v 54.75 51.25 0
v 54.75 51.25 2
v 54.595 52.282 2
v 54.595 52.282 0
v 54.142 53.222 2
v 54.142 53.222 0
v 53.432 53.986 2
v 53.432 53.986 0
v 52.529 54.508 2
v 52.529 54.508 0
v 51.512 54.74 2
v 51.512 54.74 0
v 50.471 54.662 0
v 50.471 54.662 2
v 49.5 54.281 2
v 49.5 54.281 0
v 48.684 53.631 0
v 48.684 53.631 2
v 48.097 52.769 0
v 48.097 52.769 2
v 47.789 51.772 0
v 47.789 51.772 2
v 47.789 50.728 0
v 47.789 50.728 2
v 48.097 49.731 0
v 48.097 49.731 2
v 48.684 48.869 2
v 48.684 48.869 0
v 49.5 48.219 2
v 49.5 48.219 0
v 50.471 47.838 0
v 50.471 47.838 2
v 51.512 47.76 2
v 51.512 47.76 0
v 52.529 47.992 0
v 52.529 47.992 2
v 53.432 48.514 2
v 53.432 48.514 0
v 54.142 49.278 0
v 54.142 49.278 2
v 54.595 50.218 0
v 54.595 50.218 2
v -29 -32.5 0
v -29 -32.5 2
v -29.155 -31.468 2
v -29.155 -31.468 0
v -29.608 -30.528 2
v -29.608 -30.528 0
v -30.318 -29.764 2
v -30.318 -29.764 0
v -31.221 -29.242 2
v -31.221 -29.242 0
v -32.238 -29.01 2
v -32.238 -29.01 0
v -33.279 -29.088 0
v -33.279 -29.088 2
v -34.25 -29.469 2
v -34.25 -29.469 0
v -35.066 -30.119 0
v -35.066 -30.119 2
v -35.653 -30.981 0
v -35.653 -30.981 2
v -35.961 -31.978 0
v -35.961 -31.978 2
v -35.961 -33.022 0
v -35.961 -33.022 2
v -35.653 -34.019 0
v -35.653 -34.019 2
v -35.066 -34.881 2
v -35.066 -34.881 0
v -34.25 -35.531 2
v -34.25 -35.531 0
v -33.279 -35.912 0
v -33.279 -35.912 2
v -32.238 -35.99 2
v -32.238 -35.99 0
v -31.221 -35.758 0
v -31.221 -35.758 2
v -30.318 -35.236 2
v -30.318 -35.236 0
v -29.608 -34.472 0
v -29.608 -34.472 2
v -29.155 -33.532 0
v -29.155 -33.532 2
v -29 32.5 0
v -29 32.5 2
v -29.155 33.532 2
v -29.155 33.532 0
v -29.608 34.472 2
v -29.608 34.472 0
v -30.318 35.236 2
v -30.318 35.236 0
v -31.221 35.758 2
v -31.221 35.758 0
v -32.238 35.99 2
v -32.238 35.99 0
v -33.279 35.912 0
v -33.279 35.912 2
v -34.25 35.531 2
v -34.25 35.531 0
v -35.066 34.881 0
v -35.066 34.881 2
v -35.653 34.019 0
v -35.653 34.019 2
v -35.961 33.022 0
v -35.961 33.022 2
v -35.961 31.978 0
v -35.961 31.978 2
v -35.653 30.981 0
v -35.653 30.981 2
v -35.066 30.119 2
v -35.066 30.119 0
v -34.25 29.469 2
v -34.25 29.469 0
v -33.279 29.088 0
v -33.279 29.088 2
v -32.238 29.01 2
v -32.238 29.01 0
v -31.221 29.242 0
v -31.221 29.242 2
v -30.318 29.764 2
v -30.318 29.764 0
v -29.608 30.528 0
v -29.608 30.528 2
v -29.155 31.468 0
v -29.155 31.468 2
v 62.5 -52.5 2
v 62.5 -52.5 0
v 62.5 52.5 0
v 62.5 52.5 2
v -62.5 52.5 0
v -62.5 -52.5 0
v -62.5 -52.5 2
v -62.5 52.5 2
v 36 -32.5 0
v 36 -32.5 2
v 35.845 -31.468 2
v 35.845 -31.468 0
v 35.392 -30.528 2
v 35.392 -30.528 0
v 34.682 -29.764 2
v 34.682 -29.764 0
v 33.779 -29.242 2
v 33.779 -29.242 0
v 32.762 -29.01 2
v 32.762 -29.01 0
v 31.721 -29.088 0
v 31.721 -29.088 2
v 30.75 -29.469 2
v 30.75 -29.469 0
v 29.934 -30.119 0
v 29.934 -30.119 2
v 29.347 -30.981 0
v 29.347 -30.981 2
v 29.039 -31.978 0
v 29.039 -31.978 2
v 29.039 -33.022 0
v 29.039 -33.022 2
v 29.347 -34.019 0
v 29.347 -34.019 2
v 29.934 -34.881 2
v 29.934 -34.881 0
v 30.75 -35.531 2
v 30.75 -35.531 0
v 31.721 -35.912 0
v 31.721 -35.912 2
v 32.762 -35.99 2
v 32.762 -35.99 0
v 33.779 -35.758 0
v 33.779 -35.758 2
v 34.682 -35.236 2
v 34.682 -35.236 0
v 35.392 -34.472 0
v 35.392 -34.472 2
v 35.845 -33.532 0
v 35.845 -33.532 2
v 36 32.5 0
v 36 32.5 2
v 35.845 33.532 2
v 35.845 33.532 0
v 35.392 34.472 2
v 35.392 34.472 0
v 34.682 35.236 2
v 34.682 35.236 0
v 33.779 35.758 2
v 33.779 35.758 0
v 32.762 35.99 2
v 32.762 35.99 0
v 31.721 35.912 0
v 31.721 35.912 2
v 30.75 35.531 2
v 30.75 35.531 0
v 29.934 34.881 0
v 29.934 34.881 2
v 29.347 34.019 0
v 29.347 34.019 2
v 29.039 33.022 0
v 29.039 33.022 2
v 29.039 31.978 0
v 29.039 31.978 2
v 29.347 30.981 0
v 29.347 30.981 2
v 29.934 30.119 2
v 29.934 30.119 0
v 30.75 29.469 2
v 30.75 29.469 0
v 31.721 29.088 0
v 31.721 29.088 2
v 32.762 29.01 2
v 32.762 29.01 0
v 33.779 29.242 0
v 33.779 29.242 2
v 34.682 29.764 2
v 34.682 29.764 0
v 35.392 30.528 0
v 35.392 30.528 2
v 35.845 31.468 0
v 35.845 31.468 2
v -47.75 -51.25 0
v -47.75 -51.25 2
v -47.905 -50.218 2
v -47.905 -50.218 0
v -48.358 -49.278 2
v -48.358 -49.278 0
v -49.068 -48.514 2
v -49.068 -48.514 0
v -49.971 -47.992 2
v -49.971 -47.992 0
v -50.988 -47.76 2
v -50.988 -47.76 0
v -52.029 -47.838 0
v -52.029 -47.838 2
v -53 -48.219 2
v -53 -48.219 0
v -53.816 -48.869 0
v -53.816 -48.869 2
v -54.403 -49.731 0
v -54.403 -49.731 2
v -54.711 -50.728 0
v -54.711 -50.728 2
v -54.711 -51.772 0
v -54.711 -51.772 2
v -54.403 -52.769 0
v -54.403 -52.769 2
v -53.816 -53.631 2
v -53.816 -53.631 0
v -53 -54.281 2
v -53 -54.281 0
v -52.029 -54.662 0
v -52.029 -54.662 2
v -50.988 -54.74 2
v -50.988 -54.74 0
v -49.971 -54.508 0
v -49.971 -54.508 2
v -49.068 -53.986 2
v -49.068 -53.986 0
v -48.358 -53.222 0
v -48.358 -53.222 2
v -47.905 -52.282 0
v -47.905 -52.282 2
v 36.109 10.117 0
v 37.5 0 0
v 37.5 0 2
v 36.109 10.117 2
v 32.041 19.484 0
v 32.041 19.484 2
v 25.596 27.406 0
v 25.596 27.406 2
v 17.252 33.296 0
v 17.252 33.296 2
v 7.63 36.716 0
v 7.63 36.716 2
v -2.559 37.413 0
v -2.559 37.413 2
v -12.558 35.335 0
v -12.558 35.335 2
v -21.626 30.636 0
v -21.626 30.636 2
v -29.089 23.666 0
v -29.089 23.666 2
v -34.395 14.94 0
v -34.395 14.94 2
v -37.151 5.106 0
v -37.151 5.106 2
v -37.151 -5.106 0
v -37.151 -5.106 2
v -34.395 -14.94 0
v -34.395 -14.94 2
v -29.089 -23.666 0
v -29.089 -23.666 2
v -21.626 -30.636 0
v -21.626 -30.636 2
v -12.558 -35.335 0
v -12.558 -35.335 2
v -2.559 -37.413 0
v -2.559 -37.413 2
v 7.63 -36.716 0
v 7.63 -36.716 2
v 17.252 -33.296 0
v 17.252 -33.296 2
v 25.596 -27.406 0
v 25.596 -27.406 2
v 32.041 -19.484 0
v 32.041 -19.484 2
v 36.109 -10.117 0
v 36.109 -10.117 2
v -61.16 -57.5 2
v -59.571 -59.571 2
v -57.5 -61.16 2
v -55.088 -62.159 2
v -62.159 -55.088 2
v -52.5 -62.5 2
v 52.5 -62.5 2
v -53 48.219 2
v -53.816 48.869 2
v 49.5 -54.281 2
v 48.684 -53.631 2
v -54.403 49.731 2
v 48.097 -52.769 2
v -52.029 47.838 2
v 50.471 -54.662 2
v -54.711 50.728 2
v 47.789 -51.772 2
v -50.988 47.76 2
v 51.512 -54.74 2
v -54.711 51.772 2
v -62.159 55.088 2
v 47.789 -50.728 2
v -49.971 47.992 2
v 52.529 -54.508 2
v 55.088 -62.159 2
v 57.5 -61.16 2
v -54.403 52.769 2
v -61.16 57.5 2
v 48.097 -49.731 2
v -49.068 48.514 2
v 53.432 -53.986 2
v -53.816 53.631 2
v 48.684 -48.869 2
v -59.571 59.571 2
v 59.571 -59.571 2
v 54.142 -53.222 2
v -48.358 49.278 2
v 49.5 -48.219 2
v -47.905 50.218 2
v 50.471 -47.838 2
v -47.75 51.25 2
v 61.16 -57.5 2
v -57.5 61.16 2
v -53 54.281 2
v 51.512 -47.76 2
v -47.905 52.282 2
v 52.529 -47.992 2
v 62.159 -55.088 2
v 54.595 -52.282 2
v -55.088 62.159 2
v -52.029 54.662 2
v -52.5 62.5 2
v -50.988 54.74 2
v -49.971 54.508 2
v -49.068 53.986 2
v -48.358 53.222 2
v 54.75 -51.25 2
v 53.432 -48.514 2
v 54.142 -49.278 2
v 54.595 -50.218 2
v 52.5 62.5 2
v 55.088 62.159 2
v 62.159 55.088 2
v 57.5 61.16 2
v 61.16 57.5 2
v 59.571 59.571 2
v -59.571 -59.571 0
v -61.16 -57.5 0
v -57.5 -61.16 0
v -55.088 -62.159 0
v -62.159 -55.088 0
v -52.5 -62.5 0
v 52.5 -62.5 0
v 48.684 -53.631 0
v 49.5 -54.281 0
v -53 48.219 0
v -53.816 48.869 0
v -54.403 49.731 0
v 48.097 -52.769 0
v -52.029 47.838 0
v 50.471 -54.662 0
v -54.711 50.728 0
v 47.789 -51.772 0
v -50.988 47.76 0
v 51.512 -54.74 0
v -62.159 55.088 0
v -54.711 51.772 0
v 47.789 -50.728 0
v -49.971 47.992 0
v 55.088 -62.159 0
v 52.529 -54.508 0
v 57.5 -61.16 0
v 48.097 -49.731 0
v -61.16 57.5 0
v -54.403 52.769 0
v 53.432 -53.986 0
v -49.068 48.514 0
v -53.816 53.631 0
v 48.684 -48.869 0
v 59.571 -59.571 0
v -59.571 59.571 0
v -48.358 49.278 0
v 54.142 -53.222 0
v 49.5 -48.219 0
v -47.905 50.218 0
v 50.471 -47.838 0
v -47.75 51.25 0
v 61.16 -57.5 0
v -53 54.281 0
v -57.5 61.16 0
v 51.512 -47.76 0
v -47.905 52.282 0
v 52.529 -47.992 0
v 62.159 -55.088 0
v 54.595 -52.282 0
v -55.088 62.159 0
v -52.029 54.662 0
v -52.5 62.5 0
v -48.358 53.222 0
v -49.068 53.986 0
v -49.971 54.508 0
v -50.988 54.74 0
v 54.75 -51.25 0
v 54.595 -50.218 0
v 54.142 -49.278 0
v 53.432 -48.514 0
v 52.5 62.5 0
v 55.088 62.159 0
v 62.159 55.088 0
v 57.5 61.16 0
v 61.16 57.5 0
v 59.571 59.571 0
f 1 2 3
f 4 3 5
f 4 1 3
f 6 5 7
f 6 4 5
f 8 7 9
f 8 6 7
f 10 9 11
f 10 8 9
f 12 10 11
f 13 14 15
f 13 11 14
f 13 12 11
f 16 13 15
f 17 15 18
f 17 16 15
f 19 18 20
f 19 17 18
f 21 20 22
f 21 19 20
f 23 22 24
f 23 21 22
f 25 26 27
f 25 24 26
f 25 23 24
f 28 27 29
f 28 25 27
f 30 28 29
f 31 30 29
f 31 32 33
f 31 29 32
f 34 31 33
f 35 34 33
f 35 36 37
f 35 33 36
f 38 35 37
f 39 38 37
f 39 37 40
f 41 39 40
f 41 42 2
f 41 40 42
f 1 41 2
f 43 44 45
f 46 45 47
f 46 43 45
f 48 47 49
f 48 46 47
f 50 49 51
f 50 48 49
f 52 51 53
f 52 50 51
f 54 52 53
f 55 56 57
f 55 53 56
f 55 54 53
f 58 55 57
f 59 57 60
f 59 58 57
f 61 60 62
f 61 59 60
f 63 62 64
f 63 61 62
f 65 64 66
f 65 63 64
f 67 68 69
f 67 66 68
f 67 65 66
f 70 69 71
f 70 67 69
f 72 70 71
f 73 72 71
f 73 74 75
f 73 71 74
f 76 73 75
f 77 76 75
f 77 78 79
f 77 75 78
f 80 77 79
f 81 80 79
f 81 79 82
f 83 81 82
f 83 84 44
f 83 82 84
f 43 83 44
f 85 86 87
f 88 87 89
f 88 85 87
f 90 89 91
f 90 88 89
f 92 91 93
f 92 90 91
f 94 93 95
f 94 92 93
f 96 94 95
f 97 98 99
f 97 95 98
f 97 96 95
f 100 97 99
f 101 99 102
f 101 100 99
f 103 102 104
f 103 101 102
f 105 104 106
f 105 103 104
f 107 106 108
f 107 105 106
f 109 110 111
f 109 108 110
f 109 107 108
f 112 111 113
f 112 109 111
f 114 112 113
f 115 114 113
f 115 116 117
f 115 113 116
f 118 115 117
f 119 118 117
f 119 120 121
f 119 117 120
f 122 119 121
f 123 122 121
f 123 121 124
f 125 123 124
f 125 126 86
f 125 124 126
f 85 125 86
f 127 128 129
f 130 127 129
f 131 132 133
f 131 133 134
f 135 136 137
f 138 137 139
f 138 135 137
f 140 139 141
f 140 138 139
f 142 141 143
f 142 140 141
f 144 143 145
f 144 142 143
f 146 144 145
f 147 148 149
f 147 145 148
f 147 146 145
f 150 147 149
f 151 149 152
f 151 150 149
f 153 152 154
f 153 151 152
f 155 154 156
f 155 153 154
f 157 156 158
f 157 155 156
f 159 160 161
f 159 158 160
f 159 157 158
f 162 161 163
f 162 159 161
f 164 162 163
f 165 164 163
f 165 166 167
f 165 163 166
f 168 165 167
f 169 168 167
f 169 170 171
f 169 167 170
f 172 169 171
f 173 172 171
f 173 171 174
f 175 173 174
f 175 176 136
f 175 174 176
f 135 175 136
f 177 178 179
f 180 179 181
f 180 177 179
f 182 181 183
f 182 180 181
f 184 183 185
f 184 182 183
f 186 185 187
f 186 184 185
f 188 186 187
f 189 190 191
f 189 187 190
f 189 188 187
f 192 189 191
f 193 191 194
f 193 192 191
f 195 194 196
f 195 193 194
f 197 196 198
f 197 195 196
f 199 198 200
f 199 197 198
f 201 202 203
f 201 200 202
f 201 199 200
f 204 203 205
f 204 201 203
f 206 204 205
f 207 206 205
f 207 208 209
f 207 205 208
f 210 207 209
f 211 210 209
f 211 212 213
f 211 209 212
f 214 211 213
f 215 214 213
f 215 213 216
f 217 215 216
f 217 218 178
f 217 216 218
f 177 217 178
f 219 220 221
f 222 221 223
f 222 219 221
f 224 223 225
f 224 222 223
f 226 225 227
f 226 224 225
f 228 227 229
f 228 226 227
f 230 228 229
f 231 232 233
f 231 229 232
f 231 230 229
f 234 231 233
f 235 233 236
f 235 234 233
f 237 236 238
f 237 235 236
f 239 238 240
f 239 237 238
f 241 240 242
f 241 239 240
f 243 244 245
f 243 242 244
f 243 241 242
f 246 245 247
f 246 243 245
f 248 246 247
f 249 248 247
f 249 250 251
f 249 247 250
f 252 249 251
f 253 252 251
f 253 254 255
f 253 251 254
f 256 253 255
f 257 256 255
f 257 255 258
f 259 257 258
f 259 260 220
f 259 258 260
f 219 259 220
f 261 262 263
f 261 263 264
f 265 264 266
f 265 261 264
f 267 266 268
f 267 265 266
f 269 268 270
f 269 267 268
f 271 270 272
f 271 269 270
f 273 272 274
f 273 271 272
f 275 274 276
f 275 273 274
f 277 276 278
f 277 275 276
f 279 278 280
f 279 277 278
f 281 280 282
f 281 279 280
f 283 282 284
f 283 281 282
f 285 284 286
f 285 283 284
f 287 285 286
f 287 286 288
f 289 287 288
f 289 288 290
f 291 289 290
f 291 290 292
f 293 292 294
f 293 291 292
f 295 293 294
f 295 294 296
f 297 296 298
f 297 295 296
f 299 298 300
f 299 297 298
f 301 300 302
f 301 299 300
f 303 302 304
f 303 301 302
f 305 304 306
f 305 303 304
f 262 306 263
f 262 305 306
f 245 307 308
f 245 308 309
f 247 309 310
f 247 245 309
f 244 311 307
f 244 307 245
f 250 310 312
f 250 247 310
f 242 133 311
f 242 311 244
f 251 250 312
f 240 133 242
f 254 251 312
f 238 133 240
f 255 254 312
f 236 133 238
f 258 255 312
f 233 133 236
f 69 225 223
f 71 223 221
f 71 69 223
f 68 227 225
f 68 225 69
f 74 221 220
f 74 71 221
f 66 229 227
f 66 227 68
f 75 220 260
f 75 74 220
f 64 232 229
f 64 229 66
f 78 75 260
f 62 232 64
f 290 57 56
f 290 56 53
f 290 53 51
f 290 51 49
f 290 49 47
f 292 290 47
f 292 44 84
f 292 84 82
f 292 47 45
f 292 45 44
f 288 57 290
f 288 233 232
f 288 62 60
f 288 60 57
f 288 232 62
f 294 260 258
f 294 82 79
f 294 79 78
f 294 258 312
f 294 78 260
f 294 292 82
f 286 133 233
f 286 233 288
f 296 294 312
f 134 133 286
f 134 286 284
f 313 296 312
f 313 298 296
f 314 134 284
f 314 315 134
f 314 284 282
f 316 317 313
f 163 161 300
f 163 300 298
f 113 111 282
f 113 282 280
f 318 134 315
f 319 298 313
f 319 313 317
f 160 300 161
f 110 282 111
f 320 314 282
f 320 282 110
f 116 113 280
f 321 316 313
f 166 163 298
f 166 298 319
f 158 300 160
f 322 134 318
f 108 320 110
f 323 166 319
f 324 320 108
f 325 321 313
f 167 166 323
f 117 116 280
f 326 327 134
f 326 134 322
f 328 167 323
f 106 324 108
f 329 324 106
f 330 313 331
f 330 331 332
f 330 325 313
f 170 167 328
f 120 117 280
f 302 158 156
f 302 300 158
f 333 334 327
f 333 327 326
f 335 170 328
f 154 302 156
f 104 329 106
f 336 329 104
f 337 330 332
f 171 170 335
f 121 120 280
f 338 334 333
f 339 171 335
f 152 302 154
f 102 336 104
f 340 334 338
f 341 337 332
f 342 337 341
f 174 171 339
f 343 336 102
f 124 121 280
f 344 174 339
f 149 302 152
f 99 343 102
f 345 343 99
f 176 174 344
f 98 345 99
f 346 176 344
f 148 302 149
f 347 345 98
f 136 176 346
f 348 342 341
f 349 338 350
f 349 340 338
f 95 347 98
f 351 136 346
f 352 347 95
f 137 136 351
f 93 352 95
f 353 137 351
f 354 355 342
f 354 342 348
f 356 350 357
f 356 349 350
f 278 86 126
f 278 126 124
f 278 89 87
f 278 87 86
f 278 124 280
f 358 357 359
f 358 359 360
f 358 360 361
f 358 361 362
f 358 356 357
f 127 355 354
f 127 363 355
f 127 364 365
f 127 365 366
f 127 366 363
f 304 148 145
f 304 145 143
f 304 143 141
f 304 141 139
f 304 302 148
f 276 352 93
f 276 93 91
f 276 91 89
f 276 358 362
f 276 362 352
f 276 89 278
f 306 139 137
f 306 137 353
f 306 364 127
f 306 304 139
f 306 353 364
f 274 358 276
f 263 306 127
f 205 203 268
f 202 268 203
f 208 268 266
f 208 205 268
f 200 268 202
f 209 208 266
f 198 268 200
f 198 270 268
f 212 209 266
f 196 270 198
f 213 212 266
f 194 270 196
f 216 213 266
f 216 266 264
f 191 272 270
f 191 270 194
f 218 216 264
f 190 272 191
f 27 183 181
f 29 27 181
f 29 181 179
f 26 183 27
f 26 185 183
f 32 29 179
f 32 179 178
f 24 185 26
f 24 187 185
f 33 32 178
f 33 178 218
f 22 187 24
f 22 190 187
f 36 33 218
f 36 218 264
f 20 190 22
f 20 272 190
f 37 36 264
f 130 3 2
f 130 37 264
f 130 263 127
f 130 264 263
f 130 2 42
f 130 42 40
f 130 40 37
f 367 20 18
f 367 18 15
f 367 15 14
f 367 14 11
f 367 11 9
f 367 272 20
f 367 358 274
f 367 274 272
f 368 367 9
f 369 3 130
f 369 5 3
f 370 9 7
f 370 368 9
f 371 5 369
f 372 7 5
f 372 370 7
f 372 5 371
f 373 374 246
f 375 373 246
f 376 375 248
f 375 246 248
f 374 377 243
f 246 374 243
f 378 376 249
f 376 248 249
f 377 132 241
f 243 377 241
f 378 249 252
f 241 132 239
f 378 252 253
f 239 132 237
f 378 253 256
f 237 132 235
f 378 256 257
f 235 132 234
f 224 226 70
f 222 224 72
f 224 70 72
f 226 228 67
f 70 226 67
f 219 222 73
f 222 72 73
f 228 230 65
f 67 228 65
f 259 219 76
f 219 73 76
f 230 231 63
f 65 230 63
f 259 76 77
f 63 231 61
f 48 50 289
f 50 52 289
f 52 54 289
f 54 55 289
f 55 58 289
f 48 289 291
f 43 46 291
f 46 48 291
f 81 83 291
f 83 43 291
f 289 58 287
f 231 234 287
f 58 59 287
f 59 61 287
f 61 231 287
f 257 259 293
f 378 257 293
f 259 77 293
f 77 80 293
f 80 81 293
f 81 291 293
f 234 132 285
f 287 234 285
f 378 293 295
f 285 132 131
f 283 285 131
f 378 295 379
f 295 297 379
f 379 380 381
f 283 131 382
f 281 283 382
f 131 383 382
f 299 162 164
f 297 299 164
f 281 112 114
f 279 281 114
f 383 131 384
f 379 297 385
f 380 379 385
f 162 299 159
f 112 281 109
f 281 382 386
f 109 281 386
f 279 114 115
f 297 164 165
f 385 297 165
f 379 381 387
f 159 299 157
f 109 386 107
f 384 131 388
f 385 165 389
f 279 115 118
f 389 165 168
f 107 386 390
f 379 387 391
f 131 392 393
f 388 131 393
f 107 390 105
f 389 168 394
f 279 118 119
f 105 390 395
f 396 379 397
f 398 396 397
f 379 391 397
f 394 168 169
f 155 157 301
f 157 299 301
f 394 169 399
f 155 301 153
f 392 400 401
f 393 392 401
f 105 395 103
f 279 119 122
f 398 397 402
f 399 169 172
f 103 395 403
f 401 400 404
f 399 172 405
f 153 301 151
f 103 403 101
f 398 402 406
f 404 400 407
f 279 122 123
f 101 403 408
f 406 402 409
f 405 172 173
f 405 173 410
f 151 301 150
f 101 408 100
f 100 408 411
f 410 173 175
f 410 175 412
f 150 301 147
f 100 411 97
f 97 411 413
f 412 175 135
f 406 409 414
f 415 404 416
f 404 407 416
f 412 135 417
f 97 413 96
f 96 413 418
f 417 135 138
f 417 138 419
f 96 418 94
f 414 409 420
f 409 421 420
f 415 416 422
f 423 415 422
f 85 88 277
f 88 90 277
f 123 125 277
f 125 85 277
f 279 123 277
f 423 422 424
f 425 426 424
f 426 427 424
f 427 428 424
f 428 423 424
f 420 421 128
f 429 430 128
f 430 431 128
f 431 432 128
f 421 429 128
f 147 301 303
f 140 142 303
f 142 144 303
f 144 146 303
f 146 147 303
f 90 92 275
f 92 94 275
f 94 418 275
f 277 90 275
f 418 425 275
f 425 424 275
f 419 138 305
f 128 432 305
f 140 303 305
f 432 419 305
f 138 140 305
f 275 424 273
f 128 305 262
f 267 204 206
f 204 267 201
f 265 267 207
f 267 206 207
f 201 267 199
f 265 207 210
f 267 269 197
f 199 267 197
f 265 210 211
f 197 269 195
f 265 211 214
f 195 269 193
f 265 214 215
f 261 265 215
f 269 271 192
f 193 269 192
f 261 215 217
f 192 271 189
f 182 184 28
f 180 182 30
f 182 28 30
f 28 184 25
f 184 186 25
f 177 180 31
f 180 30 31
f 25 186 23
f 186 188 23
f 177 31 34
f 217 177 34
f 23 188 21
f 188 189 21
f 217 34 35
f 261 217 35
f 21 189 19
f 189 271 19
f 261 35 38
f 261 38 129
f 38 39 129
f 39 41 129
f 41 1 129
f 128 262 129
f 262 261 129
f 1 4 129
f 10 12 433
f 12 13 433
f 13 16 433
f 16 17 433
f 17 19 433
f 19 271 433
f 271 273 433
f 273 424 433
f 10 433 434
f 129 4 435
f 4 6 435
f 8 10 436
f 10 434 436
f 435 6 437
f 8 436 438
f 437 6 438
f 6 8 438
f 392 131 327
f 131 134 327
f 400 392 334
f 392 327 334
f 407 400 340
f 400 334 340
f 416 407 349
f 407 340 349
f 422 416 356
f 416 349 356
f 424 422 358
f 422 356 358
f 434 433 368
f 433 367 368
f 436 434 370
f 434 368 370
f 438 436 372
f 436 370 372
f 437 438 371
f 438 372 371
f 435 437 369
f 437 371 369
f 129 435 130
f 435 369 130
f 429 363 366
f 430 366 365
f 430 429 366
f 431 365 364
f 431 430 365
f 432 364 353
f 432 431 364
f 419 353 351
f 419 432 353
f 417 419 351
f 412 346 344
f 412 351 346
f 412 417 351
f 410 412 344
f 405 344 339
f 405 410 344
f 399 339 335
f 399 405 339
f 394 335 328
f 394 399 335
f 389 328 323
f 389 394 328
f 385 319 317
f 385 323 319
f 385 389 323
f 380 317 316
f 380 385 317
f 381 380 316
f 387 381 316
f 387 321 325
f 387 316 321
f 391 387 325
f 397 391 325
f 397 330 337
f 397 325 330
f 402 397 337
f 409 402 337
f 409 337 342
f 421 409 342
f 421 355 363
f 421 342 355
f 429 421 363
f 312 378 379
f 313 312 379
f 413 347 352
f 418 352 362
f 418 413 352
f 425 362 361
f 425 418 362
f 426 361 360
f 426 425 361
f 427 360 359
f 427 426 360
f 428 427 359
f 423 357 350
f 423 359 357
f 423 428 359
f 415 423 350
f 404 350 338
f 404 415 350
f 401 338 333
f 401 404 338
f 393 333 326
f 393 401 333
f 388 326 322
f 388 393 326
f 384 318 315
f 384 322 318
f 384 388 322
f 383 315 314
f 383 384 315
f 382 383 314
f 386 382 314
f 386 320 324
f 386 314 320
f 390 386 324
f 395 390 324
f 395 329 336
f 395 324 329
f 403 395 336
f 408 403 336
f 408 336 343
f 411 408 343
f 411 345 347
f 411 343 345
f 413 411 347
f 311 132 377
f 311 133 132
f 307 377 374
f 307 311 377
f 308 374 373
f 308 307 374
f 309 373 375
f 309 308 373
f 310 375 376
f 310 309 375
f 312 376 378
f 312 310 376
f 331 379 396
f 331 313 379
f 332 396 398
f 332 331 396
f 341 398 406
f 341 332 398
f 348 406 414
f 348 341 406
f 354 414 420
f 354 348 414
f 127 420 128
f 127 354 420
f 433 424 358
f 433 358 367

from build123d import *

# Parameters (mm, degrees)
F0_W     = 125
F0_H     = 125
F0_R     = 37.5
F1_DEPTH = 2
F2_R     = 3.5
F3_DEPTH = 2.001
F4_R     = 10


with BuildPart() as f1:
    # F0 (on Top) → F1 (new body)
    with BuildSketch(Plane.XY):
        Rectangle(F0_W, F0_H)
        Circle(F0_R, mode=Mode.SUBTRACT)
    extrude(amount=F1_DEPTH)

    # F2 (on Top) → F3 (cut, through all)
    with BuildSketch(Plane.XY):
        with Locations((-51.25, 51.25)):
            Circle(F2_R)
        with Locations((51.25, 51.25)):
            Circle(F2_R)
        with Locations((-51.25, -51.25)):
            Circle(F2_R)
        with Locations((51.25, -51.25)):
            Circle(F2_R)
        with Locations((-32.5, 32.5)):
            Circle(F2_R)
        with Locations((32.5, 32.5)):
            Circle(F2_R)
        with Locations((-32.5, -32.5)):
            Circle(F2_R)
        with Locations((32.5, -32.5)):
            Circle(F2_R)
    extrude(amount=F3_DEPTH, mode=Mode.SUBTRACT)

    # F4
    f4_edges = [f1.edges().sort_by_distance(p)[0] for p in [
        (62.5, -62.5, 1),
        (62.5, 62.5, 1),
        (-62.5, -62.5, 1),
        (-62.5, 62.5, 1),
    ]]
    fillet(f4_edges, radius=F4_R)


solid = f1.part
